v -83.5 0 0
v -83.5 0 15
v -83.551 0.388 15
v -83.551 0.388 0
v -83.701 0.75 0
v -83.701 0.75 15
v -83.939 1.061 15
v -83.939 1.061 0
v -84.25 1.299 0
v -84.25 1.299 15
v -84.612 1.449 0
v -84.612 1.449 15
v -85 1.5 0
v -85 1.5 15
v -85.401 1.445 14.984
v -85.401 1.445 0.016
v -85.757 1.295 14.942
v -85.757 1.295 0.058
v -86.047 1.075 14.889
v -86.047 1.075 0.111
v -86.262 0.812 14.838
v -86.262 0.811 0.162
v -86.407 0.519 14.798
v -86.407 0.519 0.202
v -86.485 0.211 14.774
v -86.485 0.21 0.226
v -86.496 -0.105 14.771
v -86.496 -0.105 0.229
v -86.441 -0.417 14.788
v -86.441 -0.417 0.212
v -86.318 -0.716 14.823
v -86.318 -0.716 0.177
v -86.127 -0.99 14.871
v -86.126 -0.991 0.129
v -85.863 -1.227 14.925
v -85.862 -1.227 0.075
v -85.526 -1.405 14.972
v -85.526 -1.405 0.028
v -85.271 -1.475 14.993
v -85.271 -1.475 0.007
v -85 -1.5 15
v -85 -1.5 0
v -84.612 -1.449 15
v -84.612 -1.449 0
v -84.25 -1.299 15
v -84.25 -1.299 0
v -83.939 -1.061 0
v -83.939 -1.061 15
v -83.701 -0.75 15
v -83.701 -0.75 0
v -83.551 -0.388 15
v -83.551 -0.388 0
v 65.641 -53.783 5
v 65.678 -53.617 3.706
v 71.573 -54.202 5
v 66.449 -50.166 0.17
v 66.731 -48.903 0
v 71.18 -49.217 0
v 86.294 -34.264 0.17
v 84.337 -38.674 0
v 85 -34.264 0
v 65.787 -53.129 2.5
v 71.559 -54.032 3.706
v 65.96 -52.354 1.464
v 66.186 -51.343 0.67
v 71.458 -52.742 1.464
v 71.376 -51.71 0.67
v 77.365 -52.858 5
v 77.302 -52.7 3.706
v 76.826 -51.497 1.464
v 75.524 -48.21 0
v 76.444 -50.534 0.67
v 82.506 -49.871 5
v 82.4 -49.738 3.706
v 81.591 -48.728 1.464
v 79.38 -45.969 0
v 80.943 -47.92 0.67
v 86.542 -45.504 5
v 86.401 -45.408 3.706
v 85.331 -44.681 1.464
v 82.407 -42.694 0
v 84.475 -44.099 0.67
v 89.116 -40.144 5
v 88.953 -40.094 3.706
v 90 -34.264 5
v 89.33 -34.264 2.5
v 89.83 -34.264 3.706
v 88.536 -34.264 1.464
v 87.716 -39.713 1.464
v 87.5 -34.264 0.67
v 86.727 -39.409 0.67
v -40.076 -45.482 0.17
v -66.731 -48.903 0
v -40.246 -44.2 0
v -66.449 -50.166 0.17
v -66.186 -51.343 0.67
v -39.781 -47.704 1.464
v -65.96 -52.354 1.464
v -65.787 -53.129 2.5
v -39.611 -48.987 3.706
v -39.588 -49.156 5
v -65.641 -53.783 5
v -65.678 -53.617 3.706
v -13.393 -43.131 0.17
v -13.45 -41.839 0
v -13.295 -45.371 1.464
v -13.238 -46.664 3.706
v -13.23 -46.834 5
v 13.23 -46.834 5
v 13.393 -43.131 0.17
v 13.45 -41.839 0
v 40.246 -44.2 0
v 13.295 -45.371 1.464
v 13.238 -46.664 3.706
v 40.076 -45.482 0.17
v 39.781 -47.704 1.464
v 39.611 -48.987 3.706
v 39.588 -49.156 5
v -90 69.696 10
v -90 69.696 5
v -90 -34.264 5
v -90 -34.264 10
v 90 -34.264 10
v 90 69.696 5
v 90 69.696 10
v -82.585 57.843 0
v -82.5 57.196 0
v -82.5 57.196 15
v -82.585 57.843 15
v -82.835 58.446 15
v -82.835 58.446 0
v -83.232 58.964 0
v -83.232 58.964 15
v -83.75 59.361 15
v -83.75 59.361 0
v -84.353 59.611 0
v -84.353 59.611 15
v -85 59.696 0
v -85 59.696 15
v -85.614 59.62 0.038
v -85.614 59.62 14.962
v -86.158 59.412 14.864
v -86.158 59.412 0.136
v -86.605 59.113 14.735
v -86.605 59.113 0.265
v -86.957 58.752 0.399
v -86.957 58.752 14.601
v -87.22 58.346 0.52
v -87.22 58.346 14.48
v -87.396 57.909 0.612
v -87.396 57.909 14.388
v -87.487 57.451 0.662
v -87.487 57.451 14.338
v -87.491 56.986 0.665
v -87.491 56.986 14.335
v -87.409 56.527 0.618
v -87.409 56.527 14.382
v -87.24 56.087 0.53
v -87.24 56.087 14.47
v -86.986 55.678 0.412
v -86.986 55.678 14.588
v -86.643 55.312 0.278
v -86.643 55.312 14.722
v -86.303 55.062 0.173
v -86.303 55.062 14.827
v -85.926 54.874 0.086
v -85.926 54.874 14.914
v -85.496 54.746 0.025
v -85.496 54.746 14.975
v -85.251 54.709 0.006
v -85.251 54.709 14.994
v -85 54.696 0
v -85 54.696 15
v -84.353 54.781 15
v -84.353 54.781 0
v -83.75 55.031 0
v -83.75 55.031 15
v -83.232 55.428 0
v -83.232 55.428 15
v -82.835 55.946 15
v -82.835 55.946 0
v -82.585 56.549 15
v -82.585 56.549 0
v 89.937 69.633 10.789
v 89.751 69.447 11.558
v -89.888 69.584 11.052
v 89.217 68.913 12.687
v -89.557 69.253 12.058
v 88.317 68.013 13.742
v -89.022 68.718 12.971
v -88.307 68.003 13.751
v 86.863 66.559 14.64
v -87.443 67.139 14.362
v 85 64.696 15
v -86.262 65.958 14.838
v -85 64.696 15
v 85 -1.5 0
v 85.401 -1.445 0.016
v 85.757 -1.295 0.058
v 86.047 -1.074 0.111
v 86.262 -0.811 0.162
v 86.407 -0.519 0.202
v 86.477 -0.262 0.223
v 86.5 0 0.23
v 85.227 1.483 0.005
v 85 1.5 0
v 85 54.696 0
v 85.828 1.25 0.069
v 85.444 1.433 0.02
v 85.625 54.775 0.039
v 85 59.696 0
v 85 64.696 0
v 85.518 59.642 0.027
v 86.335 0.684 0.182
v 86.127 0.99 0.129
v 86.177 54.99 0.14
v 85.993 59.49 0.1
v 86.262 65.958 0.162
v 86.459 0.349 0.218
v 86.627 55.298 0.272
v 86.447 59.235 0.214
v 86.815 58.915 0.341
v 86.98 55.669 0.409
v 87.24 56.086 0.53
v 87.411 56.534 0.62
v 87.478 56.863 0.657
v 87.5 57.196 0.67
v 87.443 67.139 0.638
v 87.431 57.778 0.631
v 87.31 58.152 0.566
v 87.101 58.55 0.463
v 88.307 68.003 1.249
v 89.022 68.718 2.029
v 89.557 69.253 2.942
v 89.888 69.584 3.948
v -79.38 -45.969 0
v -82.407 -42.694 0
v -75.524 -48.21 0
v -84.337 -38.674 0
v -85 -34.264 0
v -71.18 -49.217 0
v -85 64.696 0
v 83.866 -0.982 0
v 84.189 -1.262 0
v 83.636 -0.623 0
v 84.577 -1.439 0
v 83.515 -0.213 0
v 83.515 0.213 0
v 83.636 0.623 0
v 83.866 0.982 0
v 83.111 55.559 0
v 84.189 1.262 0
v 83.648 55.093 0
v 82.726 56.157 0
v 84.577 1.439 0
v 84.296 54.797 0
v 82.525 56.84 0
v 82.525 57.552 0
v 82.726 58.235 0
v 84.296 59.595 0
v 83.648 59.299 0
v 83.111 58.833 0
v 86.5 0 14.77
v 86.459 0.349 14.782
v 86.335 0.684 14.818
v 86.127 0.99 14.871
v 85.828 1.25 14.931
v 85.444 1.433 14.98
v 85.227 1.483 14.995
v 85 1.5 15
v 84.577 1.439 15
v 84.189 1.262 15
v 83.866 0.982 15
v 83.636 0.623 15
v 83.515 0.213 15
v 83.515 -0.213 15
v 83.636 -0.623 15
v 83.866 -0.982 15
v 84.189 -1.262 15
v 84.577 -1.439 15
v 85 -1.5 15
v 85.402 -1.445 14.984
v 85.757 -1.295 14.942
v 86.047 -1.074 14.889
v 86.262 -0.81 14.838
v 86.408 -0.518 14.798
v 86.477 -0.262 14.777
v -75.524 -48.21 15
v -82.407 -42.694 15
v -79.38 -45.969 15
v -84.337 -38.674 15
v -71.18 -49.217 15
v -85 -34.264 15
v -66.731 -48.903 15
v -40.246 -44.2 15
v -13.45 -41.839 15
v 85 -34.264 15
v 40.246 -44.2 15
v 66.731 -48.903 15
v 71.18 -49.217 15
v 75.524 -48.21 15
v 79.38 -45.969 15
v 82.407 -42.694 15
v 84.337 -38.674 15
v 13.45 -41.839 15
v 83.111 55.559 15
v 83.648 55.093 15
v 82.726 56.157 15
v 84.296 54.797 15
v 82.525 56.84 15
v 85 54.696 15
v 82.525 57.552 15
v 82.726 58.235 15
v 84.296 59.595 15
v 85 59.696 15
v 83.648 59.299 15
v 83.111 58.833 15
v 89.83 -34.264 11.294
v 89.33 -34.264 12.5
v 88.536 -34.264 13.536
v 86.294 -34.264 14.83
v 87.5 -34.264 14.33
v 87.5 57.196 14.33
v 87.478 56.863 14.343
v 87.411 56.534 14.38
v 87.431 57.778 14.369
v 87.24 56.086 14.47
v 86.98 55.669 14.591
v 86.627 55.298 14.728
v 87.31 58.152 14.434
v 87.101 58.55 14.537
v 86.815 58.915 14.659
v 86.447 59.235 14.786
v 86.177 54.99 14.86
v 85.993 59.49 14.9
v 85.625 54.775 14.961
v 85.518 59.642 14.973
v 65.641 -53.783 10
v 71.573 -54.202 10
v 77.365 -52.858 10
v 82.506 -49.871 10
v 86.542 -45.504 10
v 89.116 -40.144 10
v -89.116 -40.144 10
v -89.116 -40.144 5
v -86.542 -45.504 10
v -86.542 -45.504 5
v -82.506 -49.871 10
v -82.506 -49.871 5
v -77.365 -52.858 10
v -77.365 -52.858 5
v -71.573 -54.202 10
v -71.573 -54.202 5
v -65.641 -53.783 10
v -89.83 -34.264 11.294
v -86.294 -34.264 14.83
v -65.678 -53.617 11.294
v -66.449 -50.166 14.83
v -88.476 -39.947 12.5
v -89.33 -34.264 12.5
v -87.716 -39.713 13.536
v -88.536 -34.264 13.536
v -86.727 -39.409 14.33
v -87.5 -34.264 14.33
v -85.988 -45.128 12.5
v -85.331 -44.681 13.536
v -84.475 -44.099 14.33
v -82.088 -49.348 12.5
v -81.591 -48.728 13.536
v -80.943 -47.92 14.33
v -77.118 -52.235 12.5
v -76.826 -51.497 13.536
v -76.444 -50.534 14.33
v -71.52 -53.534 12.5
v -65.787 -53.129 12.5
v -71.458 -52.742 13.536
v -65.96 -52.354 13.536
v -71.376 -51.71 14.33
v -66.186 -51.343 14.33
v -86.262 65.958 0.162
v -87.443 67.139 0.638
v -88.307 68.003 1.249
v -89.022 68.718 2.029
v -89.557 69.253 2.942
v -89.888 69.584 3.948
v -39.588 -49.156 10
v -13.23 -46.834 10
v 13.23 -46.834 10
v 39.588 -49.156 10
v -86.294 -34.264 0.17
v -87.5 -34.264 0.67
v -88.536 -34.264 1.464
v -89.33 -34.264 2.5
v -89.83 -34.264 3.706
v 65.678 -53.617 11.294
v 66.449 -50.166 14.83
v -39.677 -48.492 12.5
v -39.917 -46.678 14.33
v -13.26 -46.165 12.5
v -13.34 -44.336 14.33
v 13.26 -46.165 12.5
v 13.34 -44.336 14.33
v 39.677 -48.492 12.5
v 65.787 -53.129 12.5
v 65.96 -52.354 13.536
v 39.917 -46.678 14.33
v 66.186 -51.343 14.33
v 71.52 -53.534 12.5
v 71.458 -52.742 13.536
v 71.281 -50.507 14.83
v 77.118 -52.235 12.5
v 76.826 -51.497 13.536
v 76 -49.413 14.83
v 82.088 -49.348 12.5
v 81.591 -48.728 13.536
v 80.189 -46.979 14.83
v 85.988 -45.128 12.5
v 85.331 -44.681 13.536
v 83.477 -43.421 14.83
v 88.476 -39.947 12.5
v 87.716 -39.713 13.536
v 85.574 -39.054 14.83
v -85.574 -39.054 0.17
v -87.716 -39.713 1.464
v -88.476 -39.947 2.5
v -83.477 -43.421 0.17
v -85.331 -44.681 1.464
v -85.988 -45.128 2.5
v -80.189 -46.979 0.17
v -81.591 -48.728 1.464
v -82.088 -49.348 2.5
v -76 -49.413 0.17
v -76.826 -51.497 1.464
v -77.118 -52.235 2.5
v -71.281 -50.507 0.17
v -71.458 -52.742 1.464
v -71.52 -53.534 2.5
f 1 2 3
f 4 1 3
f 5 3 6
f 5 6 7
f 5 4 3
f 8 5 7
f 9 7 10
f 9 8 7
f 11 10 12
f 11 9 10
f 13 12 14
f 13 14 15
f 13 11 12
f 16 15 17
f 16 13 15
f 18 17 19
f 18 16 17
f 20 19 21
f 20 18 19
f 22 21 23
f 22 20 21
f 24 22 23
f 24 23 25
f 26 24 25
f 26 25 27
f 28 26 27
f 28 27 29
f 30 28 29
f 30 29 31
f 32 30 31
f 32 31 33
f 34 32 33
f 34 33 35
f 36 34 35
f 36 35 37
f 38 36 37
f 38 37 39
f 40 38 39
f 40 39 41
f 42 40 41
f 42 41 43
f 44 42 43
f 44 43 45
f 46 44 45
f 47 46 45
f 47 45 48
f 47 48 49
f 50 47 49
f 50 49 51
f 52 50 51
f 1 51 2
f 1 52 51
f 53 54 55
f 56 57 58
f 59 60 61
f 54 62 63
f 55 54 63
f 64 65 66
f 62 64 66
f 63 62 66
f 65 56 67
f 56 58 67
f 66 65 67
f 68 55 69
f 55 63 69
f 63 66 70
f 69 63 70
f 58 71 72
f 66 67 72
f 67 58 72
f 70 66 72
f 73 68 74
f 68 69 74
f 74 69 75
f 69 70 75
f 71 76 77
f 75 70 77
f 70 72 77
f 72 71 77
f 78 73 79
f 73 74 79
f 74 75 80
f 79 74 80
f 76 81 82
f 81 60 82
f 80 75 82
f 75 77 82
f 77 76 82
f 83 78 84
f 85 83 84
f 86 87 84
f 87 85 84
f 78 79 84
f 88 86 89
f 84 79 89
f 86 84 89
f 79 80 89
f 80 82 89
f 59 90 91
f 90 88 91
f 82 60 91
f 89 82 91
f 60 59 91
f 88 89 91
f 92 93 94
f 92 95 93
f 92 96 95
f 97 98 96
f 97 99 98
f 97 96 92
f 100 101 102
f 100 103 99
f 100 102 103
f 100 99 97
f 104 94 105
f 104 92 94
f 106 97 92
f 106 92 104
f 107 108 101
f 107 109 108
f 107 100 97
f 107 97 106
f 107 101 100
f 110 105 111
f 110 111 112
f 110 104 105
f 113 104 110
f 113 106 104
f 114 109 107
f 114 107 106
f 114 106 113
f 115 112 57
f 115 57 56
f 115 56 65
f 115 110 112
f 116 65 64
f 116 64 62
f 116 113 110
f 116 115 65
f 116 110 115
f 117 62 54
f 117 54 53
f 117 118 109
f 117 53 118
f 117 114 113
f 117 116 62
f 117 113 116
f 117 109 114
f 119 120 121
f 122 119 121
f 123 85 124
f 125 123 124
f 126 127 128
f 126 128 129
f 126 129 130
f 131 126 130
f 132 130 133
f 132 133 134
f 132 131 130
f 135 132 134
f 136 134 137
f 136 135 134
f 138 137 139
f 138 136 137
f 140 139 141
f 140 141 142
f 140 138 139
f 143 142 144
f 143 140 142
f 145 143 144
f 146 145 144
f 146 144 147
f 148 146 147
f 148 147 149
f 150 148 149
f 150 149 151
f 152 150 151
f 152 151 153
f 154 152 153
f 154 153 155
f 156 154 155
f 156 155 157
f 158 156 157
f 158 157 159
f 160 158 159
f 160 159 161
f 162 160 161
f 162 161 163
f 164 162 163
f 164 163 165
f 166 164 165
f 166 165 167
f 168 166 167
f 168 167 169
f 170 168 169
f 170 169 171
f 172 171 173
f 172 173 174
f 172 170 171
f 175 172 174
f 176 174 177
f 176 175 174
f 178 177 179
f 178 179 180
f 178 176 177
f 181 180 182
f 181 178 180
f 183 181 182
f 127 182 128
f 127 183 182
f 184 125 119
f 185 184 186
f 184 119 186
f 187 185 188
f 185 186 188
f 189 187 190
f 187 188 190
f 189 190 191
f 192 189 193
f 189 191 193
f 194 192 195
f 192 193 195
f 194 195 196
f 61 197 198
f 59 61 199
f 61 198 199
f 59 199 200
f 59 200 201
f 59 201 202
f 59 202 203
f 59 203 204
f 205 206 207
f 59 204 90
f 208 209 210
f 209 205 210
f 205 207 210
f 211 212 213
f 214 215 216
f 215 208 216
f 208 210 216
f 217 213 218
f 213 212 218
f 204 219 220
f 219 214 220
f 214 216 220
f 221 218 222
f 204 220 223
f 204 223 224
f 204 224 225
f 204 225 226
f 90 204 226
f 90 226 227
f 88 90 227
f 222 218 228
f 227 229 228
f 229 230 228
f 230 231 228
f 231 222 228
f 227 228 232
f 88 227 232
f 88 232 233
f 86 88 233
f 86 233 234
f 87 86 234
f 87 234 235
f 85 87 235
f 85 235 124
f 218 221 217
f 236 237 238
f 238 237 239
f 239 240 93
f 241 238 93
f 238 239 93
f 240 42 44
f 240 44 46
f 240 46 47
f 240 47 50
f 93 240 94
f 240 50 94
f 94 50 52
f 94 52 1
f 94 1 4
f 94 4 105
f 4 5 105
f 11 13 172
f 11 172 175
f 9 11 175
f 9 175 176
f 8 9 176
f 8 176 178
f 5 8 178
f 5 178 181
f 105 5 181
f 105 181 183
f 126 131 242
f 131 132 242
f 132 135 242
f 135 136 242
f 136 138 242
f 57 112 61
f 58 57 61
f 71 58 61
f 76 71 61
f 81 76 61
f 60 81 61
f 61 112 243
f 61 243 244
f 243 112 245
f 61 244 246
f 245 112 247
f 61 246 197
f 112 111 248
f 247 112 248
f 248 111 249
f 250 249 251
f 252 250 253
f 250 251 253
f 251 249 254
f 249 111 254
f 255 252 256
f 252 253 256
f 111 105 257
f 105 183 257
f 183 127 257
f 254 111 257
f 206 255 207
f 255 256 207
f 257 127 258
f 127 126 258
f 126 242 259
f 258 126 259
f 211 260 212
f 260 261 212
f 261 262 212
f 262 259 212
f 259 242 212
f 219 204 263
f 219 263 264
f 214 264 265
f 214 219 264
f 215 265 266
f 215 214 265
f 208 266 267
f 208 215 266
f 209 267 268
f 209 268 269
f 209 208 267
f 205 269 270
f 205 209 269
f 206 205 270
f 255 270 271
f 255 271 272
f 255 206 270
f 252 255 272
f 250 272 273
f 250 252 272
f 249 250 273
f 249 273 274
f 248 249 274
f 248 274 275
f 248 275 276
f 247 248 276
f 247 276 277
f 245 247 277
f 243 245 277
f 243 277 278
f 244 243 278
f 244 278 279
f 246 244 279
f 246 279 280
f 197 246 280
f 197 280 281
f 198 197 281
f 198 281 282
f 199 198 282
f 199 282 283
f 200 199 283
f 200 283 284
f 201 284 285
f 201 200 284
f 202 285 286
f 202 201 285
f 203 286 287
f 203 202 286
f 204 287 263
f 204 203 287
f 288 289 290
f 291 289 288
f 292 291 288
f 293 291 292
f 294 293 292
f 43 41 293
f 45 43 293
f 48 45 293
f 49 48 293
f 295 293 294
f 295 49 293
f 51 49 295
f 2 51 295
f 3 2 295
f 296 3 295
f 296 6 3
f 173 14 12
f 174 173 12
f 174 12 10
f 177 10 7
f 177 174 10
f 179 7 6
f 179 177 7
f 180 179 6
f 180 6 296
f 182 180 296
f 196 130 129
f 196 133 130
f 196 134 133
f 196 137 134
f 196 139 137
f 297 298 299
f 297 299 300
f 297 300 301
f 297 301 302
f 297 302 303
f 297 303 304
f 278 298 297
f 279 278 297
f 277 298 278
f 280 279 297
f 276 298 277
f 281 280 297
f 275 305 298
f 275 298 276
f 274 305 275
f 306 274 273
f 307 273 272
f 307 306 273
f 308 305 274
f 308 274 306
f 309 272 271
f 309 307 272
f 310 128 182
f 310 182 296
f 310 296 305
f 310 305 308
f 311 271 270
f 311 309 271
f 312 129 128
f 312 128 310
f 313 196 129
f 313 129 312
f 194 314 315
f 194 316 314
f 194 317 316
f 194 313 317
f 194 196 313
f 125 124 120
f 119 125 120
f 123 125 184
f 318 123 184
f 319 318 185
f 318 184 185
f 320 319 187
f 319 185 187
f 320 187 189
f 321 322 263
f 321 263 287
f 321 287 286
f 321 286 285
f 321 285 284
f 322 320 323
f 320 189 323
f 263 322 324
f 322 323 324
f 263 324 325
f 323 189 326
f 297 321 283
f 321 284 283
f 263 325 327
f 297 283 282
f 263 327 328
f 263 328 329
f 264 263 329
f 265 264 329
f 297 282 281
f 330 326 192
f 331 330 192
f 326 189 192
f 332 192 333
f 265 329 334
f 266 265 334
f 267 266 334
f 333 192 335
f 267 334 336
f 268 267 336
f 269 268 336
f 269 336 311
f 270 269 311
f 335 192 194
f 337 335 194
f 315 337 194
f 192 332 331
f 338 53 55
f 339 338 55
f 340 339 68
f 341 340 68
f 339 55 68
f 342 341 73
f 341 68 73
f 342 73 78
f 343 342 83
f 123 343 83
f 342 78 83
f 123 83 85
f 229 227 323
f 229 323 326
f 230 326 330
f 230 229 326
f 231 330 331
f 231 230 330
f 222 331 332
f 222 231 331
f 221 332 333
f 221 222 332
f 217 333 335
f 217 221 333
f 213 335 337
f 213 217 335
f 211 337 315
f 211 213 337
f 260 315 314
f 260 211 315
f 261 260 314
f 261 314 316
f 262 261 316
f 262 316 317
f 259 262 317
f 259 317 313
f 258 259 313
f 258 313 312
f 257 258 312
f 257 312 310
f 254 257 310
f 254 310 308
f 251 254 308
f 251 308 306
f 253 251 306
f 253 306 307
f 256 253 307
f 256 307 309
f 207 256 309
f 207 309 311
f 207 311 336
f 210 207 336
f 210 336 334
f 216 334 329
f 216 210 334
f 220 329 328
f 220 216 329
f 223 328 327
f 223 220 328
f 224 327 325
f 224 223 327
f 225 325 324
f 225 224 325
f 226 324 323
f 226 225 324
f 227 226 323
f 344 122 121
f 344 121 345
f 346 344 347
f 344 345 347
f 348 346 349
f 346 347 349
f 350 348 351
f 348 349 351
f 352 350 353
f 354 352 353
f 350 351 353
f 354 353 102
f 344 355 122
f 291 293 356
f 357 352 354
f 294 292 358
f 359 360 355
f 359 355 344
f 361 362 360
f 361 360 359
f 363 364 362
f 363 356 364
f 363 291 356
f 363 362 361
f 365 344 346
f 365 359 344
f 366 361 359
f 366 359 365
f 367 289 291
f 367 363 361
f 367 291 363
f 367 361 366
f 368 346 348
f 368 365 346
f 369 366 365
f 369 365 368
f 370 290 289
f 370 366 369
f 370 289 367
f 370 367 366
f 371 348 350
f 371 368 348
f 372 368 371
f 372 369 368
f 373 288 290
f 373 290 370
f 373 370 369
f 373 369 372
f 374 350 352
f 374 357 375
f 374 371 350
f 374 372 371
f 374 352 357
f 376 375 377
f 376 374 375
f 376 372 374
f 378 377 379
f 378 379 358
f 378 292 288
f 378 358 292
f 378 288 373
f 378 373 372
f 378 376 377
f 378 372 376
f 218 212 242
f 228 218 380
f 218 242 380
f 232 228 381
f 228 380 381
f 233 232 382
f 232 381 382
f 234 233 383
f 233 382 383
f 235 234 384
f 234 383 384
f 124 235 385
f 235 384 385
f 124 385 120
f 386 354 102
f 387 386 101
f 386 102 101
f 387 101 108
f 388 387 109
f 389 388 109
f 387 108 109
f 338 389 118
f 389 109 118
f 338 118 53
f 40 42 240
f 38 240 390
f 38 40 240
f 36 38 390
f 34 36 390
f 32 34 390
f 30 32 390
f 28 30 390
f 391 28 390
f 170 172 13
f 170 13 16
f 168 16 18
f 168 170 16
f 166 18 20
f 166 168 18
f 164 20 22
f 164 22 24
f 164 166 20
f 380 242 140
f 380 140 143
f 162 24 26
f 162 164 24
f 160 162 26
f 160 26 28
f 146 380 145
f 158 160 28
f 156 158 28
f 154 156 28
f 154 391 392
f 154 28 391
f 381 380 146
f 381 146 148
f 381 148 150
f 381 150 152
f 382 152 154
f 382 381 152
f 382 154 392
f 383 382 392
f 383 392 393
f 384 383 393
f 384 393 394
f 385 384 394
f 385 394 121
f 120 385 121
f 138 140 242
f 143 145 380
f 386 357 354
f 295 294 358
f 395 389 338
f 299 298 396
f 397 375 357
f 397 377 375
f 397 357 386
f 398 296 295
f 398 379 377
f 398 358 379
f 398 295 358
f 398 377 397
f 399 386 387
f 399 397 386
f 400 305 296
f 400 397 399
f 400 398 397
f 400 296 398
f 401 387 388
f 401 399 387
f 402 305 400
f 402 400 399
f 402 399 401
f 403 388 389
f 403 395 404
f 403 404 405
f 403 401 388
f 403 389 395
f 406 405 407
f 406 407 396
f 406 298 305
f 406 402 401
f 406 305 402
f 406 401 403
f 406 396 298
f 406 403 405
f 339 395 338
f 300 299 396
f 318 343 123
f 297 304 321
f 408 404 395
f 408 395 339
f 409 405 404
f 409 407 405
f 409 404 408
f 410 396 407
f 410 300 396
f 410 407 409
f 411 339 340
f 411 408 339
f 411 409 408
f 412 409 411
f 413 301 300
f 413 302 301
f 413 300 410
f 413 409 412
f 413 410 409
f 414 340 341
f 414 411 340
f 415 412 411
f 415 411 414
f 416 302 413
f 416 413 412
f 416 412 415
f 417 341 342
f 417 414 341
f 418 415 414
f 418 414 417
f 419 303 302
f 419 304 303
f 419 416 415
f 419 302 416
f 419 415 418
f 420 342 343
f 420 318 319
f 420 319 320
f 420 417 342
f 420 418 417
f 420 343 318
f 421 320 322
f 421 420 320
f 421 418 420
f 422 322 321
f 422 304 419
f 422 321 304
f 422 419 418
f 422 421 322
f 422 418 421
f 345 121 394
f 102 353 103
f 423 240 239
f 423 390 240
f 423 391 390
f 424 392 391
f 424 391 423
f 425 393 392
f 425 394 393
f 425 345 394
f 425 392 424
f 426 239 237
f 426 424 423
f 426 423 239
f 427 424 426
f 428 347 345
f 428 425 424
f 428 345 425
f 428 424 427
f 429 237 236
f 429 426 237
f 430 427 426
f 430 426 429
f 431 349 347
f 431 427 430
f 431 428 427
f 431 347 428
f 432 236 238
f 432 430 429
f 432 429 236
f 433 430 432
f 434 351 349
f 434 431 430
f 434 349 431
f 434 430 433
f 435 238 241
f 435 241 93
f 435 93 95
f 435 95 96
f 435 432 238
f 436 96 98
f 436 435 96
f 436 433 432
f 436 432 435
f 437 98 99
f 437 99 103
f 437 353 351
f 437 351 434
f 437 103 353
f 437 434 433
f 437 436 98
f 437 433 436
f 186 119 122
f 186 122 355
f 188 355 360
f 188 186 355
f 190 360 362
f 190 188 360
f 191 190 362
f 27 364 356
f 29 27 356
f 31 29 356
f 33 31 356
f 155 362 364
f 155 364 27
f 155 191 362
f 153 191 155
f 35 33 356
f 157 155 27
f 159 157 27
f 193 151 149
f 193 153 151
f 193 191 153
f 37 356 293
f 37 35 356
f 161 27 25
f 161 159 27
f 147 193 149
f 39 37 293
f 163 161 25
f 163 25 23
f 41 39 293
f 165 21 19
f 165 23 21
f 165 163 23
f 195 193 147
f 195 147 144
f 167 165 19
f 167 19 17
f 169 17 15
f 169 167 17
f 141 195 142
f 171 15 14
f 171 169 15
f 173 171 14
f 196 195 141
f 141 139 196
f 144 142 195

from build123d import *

# Parameters (mm, degrees)
F0_R         = 1.5
F0_R_2       = 2.5
F1_DEPTH     = 15
F2_T1_DEPTH  = 116.4597183962
F2_T3_DEPTH  = 205
F2_T6_ANGLE  = 102.5879293722
F2_T8_ANGLE  = 25.1758587444
F2_T10_ANGLE = 102.5879293722
F3_T1_DEPTH  = 205
F3_T3_DEPTH  = 116.4597183962
F3_T6_ANGLE  = 102.5879293722
F3_T8_ANGLE  = 25.1758587444
F3_T10_ANGLE = 102.5879293722


# Not quite as in the source:
# - a fillet or chamfer that OpenCascade refuses, or shapes differently, is made with other operations: its cross-section is extruded or revolved along the edge and cut away or added


with BuildPart() as f1:
    # F0 (on Top) → F1 (new body)
    with BuildSketch(Plane.XY):
        with BuildLine():
            Line((90, 69.696), (-90, 69.696))
            Line((-90, 69.696), (-90, -34.2637183962))
            ThreePointArc((-90, -34.2637183962), (-82.5064972072, -49.8710092439), (-65.6412472394, -53.7829723362))
            ThreePointArc((-65.6412472394, -53.7829723362), (0, -46.5431097607), (65.6412472394, -53.7829723362))
            ThreePointArc((65.6412472394, -53.7829723362), (82.5064972072, -49.8710092439), (90, -34.2637183962))
            Line((90, -34.2637183962), (90, 69.696))
        make_face()
        with Locations((-85, 0)):
            Circle(F0_R, mode=Mode.SUBTRACT)
        with Locations((85, 0)):
            Circle(F0_R, mode=Mode.SUBTRACT)
        with Locations((-85, 57.196)):
            Circle(F0_R_2, mode=Mode.SUBTRACT)
        with Locations((85, 57.196)):
            Circle(F0_R_2, mode=Mode.SUBTRACT)
    extrude(amount=F1_DEPTH)

    # F2: fillet of radius 5 on 2 edges, made by hand

    # F2_s2 → F2_t1 (cut)
    with BuildSketch(Plane.XZ.offset(-82.196)):
        with BuildLine():
            ThreePointArc((-90, 10), (-88.5355339059, 13.5355339059), (-85, 15))
            Line((-85, 15), (-90, 15))
            Line((-90, 15), (-90, 10))
        make_face()
        with BuildLine():
            ThreePointArc((90, 10), (88.5355339059, 13.5355339059), (85, 15))
            Line((85, 15), (90, 15))
            Line((90, 15), (90, 10))
        make_face()
    extrude(amount=F2_T1_DEPTH, mode=Mode.SUBTRACT)

    # F2_s4 → F2_t3 (cut)
    with BuildSketch(Plane.YZ.offset(-102.5)):
        with BuildLine():
            ThreePointArc((69.696, 10), (68.2315339059, 13.5355339059), (64.696, 15))
            Line((64.696, 15), (69.696, 15))
            Line((69.696, 15), (69.696, 10))
        make_face()
    extrude(amount=F2_T3_DEPTH, mode=Mode.SUBTRACT)

    # F2_s5 → F2_t6 (revolve, cut)
    with BuildSketch(Plane.XZ.offset(34.2637183962)):
        with BuildLine():
            ThreePointArc((-90, 10), (-88.5355339059, 13.5355339059), (-85, 15))
            Line((-85, 15), (-90, 15))
            Line((-90, 15), (-90, 10))
        make_face()
    revolve(axis=Axis((-70, -34.2637183962, 15), (0, 0, 1)), revolution_arc=F2_T6_ANGLE, mode=Mode.SUBTRACT)

    # F2_s7 → F2_t8 (revolve, cut)
    with BuildSketch(Plane(origin=(-73.9630818252, -16.5163478111, 0), x_dir=(0, 0, 1), z_dir=(-0.975962697, -0.217937638, 0))):
        with BuildLine():
            ThreePointArc((10, -38.1844763532), (13.5355339059, -36.7200102591), (15, -33.1844763532))
            Line((15, -33.1844763532), (15, -38.1844763532))
            Line((15, -38.1844763532), (10, -38.1844763532))
        make_face()
    revolve(axis=Axis((0, -347.7359089185, 15), (0, 0, -1)), revolution_arc=F2_T8_ANGLE, mode=Mode.SUBTRACT)

    # F2_s9 → F2_t10 (revolve, cut)
    with BuildSketch(Plane(origin=(73.9630818252, -16.5163478111, 0), x_dir=(0, 0, 1), z_dir=(-0.975962697, 0.217937638, 0))):
        with BuildLine():
            ThreePointArc((10, -38.1844763532), (13.5355339059, -36.7200102591), (15, -33.1844763532))
            Line((15, -33.1844763532), (15, -38.1844763532))
            Line((15, -38.1844763532), (10, -38.1844763532))
        make_face()
    revolve(axis=Axis((70, -34.2637183962, 15), (0, 0, 1)), revolution_arc=F2_T10_ANGLE, mode=Mode.SUBTRACT)

    # F3: fillet of radius 5 on 2 edges, made by hand

    # F3_s2 → F3_t1 (cut)
    with BuildSketch(Plane.YZ.offset(-102.5)):
        with BuildLine():
            ThreePointArc((64.696, 0), (68.2315339059, 1.4644660941), (69.696, 5))
            Line((69.696, 5), (69.696, 0))
            Line((69.696, 0), (64.696, 0))
        make_face()
    extrude(amount=F3_T1_DEPTH, mode=Mode.SUBTRACT)

    # F3_s4 → F3_t3 (cut)
    with BuildSketch(Plane.XZ.offset(-82.196)):
        with BuildLine():
            ThreePointArc((-85, 0), (-88.5355339059, 1.4644660941), (-90, 5))
            Line((-90, 5), (-90, 0))
            Line((-90, 0), (-85, 0))
        make_face()
        with BuildLine():
            ThreePointArc((85, 0), (88.5355339059, 1.4644660941), (90, 5))
            Line((90, 5), (90, 0))
            Line((90, 0), (85, 0))
        make_face()
    extrude(amount=F3_T3_DEPTH, mode=Mode.SUBTRACT)

    # F3_s5 → F3_t6 (revolve, cut)
    with BuildSketch(Plane.XZ.offset(34.2637183962)):
        with BuildLine():
            ThreePointArc((-85, 0), (-88.5355339059, 1.4644660941), (-90, 5))
            Line((-90, 5), (-90, 0))
            Line((-90, 0), (-85, 0))
        make_face()
    revolve(axis=Axis((-70, -34.2637183962, 0), (0, 0, 1)), revolution_arc=F3_T6_ANGLE, mode=Mode.SUBTRACT)

    # F3_s7 → F3_t8 (revolve, cut)
    with BuildSketch(Plane(origin=(-73.9630818252, -16.5163478111, 0), x_dir=(0, 0, 1), z_dir=(-0.975962697, -0.217937638, 0))):
        with BuildLine():
            ThreePointArc((0, -33.1844763532), (1.4644660941, -36.7200102591), (5, -38.1844763532))
            Line((5, -38.1844763532), (0, -38.1844763532))
            Line((0, -38.1844763532), (0, -33.1844763532))
        make_face()
    revolve(axis=Axis((0, -347.7359089185, 0), (0, 0, -1)), revolution_arc=F3_T8_ANGLE, mode=Mode.SUBTRACT)

    # F3_s9 → F3_t10 (revolve, cut)
    with BuildSketch(Plane(origin=(73.9630818252, -16.5163478111, 0), x_dir=(0, 0, 1), z_dir=(-0.975962697, 0.217937638, 0))):
        with BuildLine():
            ThreePointArc((5, -38.1844763532), (1.4644660941, -36.7200102591), (0, -33.1844763532))
            Line((0, -33.1844763532), (0, -38.1844763532))
            Line((0, -38.1844763532), (5, -38.1844763532))
        make_face()
    revolve(axis=Axis((70, -34.2637183962, 0), (0, 0, 1)), revolution_arc=F3_T10_ANGLE, mode=Mode.SUBTRACT)


solid = f1.part
